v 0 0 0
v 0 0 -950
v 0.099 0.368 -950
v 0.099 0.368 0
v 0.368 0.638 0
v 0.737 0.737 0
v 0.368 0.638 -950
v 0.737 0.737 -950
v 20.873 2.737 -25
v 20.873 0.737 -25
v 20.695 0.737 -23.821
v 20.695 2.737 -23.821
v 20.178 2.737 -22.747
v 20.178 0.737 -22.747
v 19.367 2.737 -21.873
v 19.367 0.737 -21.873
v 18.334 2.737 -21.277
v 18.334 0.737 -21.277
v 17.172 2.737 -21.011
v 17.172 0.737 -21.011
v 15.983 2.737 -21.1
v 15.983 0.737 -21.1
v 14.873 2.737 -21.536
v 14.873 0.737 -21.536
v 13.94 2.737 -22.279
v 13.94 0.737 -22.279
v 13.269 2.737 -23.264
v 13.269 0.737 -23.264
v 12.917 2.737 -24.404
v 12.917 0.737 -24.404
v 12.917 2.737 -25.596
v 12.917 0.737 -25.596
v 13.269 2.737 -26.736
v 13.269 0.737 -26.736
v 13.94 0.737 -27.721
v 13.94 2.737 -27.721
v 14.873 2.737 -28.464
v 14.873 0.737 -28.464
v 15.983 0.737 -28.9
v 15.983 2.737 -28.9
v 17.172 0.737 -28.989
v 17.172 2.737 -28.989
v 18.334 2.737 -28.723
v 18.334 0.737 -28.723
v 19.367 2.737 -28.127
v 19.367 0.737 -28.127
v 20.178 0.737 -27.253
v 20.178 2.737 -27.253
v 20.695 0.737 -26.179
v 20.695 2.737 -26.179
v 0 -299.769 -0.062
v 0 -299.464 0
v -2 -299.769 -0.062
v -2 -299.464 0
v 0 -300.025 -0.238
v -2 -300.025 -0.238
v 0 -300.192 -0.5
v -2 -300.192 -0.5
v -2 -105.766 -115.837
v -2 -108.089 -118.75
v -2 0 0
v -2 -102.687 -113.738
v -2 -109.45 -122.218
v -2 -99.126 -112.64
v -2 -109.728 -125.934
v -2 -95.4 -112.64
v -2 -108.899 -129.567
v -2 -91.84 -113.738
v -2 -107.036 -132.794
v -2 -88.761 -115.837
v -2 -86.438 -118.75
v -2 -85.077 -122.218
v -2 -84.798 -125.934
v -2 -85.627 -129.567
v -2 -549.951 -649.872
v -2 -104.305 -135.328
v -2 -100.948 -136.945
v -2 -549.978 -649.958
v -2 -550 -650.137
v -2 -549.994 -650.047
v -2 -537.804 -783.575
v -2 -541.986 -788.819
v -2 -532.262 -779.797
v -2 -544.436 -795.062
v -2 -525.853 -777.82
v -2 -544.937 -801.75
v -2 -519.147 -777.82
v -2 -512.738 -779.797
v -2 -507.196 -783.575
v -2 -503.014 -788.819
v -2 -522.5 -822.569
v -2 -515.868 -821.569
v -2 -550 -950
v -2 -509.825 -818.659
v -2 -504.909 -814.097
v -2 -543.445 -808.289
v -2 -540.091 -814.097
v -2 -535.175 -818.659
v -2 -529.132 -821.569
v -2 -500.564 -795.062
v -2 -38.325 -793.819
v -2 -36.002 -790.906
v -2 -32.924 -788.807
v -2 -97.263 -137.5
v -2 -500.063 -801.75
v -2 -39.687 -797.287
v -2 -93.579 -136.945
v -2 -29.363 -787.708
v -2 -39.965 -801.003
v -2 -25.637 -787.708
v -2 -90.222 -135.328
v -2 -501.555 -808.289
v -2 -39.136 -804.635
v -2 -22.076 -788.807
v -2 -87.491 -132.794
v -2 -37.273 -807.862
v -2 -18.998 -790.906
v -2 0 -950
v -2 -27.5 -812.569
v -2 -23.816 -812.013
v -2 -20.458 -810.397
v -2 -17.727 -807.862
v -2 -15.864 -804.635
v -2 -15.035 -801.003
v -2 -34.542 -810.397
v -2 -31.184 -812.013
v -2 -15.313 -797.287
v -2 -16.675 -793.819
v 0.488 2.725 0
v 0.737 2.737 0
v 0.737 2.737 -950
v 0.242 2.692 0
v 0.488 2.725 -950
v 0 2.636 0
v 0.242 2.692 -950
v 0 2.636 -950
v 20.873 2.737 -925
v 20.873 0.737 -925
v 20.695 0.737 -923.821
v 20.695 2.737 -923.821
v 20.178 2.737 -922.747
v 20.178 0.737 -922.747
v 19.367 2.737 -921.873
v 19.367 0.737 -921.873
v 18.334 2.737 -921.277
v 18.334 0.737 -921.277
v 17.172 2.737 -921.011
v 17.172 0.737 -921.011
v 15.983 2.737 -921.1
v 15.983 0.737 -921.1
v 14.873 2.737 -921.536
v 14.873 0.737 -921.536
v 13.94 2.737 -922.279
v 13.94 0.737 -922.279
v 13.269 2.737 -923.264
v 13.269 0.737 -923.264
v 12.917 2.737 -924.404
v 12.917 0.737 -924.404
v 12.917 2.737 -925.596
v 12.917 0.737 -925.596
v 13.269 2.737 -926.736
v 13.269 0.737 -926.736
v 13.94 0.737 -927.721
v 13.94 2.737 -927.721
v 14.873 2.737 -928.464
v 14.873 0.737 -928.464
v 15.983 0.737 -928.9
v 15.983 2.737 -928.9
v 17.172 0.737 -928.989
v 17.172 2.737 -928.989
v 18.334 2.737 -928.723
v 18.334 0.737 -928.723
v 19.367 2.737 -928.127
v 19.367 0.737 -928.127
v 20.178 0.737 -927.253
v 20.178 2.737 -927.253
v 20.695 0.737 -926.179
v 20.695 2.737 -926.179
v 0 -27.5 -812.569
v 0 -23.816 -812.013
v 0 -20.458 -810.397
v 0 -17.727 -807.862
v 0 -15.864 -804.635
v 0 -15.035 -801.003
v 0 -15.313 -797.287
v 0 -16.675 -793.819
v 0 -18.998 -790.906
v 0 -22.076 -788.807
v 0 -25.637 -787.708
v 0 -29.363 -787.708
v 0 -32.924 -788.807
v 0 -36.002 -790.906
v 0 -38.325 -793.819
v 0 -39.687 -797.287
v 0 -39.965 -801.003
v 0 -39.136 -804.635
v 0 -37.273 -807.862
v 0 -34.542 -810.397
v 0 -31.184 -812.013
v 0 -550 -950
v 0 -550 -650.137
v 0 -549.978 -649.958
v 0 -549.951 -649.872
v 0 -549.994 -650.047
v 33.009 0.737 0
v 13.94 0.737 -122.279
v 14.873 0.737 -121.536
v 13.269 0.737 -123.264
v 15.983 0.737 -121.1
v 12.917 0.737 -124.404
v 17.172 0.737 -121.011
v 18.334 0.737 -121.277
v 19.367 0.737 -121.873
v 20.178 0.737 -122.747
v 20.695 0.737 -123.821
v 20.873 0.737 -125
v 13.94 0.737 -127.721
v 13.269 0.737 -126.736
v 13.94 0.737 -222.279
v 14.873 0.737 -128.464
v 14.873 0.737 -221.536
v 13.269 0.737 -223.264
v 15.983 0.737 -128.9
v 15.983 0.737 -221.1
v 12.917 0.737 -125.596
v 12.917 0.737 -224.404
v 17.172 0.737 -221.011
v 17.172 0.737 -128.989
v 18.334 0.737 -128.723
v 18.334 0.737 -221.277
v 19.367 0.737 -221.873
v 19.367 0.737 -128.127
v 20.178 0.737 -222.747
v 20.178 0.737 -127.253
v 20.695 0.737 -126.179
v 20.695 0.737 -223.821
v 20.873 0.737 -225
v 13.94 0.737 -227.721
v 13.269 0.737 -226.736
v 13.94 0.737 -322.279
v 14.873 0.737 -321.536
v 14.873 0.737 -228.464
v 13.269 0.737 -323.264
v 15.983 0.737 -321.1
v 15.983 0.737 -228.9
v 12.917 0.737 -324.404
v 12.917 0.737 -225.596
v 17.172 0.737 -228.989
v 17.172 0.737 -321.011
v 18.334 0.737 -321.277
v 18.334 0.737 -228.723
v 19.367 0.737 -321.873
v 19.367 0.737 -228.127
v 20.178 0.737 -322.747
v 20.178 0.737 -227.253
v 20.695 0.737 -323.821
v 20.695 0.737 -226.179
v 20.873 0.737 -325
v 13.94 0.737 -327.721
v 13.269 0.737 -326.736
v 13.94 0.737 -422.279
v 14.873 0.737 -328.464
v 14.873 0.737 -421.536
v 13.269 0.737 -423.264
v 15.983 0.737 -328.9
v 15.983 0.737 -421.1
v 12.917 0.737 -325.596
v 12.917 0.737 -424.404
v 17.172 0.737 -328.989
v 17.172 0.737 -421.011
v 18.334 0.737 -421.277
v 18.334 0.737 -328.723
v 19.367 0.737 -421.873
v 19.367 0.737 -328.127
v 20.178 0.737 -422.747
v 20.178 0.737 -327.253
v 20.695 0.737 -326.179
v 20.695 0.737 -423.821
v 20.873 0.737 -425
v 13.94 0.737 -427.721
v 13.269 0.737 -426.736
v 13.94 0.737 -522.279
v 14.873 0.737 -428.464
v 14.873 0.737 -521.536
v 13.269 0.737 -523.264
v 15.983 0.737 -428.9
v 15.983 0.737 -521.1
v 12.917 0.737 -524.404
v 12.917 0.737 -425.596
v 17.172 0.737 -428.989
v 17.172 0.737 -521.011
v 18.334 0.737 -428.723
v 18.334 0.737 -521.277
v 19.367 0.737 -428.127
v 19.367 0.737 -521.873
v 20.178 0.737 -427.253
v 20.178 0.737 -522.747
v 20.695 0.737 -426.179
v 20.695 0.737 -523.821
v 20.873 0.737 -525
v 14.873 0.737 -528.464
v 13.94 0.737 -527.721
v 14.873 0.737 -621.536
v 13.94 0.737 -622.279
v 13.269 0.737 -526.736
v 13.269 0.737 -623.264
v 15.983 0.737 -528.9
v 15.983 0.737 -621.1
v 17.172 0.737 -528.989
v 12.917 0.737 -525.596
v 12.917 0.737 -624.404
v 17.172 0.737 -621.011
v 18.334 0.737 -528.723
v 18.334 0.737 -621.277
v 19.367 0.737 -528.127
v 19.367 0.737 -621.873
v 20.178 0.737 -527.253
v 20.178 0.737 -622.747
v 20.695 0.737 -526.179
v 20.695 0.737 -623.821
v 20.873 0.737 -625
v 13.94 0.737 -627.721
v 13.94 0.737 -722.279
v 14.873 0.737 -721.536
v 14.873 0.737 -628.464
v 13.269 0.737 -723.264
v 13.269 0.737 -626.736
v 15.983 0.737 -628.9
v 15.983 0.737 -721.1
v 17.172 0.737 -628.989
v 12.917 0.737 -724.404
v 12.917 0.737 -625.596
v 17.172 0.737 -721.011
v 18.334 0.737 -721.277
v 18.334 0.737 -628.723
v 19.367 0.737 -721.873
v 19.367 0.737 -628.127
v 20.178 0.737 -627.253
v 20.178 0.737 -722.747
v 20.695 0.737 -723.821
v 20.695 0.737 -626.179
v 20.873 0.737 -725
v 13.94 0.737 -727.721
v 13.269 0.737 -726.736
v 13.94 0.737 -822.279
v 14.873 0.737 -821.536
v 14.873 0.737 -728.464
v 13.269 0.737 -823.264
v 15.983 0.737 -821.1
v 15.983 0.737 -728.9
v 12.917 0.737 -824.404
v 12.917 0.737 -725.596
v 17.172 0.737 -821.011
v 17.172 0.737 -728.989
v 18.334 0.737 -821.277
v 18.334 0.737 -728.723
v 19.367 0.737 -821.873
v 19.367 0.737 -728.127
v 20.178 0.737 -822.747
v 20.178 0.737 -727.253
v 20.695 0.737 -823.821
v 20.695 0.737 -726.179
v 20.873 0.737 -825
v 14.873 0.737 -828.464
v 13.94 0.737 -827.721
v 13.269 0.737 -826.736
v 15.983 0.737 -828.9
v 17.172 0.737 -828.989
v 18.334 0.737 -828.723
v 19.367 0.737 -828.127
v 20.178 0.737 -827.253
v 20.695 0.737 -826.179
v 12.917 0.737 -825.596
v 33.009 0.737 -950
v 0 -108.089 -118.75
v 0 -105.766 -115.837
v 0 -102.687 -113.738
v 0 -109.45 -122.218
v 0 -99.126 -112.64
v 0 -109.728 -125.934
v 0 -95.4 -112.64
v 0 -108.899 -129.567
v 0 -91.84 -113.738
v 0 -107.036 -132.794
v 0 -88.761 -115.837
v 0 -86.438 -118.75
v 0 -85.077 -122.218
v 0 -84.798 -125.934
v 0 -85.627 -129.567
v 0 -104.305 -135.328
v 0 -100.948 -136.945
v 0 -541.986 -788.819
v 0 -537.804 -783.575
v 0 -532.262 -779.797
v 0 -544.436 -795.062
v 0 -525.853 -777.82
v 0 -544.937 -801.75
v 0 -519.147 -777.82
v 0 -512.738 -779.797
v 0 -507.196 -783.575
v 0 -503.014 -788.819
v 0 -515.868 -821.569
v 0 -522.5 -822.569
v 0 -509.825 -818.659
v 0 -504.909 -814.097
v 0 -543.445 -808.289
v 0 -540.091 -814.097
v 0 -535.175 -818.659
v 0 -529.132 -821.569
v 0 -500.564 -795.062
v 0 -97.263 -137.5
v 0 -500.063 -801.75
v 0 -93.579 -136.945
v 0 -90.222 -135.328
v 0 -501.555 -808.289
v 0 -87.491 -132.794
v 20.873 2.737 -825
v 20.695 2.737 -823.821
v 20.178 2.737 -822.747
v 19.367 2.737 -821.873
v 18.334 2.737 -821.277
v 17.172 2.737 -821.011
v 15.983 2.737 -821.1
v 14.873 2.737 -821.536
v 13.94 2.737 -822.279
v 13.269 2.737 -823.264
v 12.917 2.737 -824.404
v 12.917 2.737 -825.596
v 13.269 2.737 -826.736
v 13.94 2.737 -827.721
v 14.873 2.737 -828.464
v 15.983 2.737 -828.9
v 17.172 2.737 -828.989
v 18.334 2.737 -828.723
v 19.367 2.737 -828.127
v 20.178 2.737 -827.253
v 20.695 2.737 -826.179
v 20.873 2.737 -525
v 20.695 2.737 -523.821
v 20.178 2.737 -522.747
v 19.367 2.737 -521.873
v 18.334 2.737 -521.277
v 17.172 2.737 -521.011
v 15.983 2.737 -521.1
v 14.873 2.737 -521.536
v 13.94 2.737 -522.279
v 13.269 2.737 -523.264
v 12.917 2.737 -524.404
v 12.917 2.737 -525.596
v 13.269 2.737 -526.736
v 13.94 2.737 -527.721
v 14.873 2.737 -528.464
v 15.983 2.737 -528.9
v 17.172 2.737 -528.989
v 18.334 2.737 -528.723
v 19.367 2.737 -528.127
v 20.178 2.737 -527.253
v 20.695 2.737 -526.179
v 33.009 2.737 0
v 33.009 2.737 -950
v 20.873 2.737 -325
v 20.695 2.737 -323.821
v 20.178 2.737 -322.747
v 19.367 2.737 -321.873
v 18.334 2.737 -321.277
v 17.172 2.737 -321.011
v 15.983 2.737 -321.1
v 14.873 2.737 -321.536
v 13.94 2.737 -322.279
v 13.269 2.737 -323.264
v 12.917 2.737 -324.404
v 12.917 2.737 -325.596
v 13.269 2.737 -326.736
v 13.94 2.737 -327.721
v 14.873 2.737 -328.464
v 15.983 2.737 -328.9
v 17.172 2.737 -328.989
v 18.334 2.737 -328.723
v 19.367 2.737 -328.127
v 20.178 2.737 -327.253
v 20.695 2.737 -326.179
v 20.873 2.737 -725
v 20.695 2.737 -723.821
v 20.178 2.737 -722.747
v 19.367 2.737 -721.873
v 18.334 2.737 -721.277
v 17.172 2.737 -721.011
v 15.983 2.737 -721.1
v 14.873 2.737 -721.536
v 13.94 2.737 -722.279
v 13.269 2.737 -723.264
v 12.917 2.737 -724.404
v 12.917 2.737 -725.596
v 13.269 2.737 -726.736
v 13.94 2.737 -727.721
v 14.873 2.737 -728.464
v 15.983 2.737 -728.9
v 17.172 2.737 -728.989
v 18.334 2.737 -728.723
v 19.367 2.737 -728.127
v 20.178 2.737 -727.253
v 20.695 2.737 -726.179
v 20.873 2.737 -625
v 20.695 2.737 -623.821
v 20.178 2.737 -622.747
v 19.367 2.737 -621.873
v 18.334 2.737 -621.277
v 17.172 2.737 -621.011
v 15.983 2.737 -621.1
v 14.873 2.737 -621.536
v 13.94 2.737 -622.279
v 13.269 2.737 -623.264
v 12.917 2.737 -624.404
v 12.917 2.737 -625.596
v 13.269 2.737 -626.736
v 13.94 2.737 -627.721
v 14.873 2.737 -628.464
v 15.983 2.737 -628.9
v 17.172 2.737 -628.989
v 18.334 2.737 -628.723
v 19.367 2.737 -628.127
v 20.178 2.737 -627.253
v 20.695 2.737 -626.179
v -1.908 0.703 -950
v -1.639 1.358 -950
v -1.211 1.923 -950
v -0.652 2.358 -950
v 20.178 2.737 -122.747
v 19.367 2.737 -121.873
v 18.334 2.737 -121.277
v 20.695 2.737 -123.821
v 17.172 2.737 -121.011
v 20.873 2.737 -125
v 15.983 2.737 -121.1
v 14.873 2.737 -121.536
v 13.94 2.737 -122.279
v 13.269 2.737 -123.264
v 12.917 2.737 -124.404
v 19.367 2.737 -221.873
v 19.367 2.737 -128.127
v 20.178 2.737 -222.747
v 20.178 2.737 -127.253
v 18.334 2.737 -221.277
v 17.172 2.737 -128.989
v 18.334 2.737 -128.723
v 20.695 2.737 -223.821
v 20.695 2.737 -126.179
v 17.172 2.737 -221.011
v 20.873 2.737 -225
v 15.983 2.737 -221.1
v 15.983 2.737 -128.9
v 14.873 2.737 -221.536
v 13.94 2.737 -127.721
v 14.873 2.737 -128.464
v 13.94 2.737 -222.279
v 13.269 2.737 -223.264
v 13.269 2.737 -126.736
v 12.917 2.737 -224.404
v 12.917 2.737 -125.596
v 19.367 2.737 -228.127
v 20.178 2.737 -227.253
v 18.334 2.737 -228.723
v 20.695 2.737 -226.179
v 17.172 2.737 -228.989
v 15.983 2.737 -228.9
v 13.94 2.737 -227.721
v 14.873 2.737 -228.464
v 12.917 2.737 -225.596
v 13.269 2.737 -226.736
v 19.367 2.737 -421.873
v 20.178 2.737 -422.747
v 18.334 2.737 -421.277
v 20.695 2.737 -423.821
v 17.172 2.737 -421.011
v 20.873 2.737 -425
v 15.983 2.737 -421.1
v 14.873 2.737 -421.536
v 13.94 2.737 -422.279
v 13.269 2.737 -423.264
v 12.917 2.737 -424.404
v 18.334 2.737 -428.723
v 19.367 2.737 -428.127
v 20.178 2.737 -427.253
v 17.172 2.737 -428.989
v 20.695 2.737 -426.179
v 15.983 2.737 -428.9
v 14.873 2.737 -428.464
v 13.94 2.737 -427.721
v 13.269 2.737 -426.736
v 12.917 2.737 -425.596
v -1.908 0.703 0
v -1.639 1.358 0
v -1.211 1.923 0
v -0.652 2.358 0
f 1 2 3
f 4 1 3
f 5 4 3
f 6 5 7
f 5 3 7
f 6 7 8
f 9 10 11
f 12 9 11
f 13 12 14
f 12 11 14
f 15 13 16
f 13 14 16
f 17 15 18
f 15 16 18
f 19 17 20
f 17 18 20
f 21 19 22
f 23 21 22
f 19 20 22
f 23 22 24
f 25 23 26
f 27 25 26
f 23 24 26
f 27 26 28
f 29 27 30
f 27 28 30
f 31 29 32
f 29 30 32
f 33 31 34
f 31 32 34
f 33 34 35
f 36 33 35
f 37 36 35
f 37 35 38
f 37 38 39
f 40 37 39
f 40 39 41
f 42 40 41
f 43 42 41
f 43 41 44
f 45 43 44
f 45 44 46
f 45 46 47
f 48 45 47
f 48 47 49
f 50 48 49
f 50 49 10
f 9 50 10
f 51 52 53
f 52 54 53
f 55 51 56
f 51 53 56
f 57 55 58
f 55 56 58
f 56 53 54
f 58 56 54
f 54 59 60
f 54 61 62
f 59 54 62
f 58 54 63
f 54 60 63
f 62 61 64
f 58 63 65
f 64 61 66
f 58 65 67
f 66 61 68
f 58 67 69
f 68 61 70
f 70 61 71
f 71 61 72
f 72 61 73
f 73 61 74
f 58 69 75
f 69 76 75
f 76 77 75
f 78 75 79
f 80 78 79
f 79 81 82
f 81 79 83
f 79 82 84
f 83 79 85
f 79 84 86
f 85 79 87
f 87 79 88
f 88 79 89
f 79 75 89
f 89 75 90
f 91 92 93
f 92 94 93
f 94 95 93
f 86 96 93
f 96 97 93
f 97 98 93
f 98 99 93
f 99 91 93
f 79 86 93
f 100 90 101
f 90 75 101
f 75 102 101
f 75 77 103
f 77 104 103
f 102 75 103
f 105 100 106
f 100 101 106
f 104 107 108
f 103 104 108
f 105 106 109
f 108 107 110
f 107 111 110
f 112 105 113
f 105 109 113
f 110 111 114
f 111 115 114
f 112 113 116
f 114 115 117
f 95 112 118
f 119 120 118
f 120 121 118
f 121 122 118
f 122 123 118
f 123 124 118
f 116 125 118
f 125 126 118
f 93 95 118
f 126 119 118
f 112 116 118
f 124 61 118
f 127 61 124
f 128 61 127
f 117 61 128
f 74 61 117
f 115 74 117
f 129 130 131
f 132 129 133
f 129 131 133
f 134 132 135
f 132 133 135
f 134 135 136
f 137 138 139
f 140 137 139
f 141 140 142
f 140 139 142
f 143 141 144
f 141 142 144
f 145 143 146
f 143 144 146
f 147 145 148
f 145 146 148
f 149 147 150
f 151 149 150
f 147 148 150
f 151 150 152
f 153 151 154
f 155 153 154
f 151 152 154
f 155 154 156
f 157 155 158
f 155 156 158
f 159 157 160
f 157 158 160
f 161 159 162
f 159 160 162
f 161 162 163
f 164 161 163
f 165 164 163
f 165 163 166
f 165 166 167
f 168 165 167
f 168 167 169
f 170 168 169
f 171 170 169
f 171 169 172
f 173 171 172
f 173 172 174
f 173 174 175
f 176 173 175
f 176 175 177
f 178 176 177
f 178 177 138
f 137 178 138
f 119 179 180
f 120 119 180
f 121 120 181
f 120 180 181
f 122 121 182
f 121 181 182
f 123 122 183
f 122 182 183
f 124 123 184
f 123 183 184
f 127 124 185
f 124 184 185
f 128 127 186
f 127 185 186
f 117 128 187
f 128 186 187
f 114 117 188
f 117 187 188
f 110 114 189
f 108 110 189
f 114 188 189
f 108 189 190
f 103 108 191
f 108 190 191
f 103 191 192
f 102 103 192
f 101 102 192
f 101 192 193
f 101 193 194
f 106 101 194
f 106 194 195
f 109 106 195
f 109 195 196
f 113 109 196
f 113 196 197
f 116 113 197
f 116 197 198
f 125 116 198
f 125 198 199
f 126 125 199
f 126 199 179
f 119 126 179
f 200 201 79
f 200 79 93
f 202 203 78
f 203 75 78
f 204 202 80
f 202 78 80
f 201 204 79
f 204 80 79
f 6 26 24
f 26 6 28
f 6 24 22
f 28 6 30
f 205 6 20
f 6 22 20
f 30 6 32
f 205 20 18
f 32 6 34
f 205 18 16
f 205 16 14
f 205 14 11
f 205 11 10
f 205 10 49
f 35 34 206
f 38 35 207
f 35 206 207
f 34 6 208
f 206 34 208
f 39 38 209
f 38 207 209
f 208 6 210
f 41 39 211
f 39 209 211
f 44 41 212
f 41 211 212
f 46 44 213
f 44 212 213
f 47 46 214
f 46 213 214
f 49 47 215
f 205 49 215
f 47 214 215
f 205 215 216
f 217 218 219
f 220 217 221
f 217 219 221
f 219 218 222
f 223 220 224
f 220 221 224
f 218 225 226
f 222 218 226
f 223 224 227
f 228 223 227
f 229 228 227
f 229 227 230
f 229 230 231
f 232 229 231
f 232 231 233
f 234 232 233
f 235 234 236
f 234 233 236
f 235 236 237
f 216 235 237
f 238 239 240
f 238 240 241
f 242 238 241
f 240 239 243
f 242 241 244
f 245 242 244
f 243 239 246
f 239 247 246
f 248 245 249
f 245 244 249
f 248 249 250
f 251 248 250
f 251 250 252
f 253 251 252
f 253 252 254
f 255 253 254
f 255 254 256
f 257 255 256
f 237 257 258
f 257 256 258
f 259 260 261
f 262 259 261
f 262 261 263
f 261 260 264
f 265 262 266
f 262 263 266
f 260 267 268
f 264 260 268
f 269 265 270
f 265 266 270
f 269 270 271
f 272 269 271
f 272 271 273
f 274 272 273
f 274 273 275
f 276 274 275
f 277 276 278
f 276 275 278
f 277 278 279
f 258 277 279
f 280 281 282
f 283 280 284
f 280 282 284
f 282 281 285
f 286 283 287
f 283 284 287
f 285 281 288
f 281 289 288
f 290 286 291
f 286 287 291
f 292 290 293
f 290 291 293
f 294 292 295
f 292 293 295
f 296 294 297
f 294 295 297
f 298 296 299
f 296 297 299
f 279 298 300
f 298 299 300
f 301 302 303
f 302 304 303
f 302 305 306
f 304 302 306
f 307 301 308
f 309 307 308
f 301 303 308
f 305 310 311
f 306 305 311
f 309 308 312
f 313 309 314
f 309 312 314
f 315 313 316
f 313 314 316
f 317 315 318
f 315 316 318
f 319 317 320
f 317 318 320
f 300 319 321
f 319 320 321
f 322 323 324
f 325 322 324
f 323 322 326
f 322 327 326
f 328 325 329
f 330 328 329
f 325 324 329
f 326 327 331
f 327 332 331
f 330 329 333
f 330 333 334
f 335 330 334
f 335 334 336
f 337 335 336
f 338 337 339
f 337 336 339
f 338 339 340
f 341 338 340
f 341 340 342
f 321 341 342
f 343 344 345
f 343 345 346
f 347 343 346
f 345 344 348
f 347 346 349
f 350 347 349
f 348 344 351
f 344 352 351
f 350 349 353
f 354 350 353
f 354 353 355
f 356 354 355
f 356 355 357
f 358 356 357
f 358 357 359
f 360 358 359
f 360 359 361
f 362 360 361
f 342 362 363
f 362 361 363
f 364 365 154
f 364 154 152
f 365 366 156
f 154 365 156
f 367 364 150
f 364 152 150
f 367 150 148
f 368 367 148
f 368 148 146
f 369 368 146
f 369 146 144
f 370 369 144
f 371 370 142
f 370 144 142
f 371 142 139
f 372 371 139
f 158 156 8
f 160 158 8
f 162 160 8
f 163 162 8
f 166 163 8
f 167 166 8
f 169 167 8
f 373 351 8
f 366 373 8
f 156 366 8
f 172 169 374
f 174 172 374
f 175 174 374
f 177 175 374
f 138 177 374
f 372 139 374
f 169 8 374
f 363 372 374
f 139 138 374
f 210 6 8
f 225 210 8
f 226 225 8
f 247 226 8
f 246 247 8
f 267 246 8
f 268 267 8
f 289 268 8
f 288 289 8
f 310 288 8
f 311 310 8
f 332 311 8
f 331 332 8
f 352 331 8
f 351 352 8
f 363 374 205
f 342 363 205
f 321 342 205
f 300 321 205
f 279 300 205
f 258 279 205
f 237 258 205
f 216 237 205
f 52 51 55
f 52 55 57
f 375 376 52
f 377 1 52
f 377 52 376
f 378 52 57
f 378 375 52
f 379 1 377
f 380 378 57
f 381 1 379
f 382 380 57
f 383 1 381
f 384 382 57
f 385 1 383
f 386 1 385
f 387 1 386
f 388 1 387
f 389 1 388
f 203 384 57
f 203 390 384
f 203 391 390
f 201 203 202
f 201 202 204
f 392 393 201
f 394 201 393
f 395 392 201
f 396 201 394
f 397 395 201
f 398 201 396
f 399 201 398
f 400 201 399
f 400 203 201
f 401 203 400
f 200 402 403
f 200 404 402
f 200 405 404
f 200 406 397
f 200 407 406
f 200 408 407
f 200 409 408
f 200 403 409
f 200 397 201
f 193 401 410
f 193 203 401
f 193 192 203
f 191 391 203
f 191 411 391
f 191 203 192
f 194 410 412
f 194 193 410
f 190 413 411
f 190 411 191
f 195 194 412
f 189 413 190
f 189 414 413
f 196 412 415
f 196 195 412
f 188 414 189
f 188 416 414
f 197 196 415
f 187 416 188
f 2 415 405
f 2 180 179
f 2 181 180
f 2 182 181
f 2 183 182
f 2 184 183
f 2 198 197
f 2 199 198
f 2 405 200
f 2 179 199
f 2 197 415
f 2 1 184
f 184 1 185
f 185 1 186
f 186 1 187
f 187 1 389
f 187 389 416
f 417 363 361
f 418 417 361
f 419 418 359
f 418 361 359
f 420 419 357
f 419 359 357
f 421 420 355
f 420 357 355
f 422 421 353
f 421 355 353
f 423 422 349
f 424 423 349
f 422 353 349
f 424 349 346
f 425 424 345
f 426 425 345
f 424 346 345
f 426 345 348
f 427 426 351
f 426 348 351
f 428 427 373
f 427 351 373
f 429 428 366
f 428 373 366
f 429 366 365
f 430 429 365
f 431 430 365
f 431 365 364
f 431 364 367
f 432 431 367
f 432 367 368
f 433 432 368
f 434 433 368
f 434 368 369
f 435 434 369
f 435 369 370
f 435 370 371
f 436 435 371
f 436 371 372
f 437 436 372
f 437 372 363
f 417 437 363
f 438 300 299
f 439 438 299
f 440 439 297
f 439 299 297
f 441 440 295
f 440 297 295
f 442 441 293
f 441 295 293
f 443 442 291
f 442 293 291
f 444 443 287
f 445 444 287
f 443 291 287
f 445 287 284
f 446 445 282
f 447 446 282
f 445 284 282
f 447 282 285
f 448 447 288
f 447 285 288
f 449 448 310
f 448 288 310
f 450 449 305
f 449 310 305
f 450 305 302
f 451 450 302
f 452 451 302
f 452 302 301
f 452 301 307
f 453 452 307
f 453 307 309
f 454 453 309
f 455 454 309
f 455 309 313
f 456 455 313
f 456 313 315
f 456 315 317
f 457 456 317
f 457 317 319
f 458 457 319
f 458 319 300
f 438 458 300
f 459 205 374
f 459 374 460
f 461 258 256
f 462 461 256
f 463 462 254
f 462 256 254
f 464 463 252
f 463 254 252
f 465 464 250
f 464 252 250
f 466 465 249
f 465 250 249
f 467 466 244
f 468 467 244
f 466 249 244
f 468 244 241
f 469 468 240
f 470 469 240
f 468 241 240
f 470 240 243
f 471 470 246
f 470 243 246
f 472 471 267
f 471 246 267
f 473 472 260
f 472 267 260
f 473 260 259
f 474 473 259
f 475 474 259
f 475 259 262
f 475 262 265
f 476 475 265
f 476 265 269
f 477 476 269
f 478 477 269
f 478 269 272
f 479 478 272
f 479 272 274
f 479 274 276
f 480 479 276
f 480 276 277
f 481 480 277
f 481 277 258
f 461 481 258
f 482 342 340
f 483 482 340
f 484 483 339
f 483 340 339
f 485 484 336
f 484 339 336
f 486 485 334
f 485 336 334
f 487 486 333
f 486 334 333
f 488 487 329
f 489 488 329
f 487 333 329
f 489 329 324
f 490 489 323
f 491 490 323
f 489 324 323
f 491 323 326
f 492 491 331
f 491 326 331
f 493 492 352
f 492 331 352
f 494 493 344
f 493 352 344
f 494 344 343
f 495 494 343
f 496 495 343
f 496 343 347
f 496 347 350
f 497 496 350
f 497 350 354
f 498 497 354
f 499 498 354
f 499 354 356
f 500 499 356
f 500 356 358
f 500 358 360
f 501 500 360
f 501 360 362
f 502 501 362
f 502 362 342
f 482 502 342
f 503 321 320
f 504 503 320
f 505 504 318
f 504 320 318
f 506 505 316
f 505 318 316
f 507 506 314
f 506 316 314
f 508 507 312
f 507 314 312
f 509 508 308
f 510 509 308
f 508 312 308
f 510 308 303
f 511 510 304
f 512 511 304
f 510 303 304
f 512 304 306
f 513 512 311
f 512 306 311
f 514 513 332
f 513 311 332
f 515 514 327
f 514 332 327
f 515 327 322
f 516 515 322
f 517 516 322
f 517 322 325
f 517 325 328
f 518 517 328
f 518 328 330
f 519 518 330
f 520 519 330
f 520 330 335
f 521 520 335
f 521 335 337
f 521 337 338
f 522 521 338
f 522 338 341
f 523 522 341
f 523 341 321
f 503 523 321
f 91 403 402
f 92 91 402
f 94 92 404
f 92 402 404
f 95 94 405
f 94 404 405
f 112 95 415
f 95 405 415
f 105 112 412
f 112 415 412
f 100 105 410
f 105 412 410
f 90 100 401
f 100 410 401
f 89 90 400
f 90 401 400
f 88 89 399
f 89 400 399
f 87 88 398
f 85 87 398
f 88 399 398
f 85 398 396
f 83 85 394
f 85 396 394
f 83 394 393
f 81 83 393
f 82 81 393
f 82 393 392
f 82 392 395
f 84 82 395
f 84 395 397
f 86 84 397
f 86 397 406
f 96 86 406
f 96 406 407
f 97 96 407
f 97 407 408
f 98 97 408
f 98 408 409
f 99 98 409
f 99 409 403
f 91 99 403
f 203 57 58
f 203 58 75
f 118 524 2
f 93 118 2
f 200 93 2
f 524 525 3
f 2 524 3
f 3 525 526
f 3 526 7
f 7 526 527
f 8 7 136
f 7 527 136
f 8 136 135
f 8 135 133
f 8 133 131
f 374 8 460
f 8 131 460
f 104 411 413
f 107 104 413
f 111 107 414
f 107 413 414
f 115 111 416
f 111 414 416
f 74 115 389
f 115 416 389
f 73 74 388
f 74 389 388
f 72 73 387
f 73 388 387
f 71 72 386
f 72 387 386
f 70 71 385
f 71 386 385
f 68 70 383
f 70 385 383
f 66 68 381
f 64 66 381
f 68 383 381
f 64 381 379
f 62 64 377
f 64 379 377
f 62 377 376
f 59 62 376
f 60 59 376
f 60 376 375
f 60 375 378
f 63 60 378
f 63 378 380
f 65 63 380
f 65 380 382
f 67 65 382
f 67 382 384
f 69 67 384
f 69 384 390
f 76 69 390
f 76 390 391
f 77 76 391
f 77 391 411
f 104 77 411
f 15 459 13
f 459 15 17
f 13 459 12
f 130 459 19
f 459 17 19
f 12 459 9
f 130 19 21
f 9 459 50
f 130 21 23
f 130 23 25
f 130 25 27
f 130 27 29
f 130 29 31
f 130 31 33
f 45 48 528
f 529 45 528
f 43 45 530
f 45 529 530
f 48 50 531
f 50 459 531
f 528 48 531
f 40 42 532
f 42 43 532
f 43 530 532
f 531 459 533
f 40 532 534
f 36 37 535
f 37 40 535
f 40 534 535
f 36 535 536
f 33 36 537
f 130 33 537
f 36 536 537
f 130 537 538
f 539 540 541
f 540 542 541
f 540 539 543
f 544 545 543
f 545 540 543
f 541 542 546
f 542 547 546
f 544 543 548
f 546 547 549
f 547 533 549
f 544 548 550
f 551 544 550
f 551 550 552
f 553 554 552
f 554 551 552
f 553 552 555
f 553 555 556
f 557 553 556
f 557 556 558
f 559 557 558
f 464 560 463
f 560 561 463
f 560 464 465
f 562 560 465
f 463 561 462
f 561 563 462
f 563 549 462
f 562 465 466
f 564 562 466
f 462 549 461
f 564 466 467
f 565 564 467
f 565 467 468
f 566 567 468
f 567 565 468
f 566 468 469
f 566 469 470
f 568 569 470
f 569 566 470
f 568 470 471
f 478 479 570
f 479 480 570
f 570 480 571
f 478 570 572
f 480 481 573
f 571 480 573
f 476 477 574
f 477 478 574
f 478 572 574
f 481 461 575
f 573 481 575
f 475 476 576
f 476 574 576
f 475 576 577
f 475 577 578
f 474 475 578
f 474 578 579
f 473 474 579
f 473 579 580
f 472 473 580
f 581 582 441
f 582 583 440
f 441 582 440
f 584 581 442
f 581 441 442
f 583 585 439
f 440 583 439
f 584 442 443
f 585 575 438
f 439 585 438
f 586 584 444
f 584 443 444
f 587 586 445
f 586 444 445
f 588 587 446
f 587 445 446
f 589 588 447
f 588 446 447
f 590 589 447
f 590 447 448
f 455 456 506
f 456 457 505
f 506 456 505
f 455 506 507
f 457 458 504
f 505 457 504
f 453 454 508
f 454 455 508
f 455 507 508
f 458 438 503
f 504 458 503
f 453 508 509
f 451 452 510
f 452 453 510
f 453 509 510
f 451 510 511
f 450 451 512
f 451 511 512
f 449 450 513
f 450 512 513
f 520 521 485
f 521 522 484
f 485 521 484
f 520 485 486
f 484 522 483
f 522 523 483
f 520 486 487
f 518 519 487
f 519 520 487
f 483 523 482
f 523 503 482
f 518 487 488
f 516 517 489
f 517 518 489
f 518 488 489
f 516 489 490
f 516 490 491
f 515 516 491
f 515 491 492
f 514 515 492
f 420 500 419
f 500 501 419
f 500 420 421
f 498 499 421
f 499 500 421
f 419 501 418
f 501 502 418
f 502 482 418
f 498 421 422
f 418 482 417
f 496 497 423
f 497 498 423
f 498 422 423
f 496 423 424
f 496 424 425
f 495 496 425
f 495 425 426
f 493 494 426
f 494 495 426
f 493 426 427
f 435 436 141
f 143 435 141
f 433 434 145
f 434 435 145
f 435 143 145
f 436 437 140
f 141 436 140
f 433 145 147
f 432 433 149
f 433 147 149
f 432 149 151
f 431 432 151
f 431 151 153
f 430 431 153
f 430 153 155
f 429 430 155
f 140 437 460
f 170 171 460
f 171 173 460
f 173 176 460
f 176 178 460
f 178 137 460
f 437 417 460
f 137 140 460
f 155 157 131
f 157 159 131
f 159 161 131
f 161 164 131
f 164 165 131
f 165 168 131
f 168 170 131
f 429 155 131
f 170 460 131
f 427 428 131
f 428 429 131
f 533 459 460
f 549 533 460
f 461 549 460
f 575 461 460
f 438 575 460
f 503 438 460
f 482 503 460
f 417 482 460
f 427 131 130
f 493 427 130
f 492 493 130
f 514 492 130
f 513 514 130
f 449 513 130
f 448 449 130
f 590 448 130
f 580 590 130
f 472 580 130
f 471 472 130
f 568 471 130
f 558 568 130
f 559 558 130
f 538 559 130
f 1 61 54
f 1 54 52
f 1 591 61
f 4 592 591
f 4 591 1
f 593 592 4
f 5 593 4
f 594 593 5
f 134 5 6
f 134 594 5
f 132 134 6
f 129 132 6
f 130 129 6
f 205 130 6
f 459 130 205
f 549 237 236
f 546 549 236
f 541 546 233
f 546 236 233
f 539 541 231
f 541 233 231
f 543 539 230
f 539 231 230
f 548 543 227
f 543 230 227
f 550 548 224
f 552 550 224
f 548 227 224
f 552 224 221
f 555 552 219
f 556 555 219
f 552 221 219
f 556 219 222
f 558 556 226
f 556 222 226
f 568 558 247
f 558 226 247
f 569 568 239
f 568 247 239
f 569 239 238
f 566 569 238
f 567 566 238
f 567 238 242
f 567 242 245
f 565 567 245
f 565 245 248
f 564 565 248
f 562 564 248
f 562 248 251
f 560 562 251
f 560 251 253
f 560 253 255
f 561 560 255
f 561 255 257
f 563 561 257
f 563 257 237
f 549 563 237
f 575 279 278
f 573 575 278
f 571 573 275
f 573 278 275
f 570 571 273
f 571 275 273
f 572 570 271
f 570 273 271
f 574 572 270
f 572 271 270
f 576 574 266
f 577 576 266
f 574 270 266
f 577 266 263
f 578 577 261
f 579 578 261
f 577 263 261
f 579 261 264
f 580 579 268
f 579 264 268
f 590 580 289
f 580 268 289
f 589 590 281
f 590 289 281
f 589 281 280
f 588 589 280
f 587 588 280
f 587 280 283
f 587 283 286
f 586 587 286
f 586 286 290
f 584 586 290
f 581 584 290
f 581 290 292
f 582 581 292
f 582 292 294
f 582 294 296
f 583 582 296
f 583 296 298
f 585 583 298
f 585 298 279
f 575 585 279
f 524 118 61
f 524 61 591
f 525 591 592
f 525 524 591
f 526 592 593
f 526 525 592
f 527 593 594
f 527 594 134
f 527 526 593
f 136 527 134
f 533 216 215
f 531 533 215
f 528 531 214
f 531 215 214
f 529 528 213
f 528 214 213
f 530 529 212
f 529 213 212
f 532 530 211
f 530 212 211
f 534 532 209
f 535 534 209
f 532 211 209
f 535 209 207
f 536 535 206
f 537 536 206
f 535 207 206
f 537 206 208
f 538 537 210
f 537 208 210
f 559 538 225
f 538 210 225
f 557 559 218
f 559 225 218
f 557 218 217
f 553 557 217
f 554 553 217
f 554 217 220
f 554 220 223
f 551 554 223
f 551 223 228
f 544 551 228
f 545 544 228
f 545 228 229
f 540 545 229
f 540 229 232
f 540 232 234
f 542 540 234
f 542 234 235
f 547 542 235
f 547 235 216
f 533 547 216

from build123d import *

# Parameters (mm, degrees)
BASE_FLANGE1_DEPTH     = 2
TAB1_START             = -2
TAB1_OUTLINE_W         = 950
TAB1_OUTLINE_H         = 35
TAB1_DEPTH             = 2
SKETCHED_START         = -950
SKETCHED_BEND1_DEPTH   = 950
SKETCHED_BEND1_2_DEPTH = 950
FILLET1_R              = 0.78
FILLET2_R              = 0.74
SKETCH10_R             = 12.5
SKETCH10_R_2           = 22.5
CUT_EXTRUDE1_DEPTH     = 10
SKETCH11_R             = 4
CUT_EXTRUDE2_DEPTH     = 10
SKETCH12_R             = 12.5
CUT_EXTRUDE3_DEPTH     = 10


# Read off the part's stored shape, not the designer's step: Tab1, Sketched Bend1
# Sheet-metal steps are written as plain solids
with BuildPart() as part:
    # Sketch1 → Base-Flange1 (new body)
    with BuildSketch(Plane(origin=(0, 0, 0), x_dir=(0, 0, -1), z_dir=(1, 0, 0))):
        Polygon((0, 0), (0, -300), (650, -550), (950, -550), (950, 0), align=None)
    extrude(amount=-BASE_FLANGE1_DEPTH)

    # Tab1 outline → Tab1 (add)
    with BuildSketch(Plane(origin=(0, 0, 0), x_dir=(0, 0, -1), z_dir=(1, 0, 0)).offset(TAB1_START)):
        with Locations((475, 17.5)):
            Rectangle(TAB1_OUTLINE_W, TAB1_OUTLINE_H)
    extrude(amount=TAB1_DEPTH)

    # Sketched Bend1 outline → Sketched Bend1 (cut)
    with BuildSketch(Plane.XY.offset(SKETCHED_START)):
        with BuildLine():
            ThreePointArc((-2, 0), (-1.443395312, 1.654267209), (0, 2.635602398))
            Line((0, 2.635602398), (0, 35))
            Line((0, 35), (-2, 35))
            Line((-2, 35), (-2, 0))
        make_face()
    extrude(amount=SKETCHED_BEND1_DEPTH, mode=Mode.SUBTRACT)

    # Sketched Bend1 2 outline → Sketched Bend1 2 (add)
    with BuildSketch(Plane.XY.offset(SKETCHED_START)):
        with BuildLine():
            Line((33.008755099, 2.7366), (0.7366, 2.7366))
            ThreePointArc((0.7366, 2.7366), (0.364854094, 2.711233029), (0, 2.635602398))
            Line((0, 2.635602398), (0, 0))
            ThreePointArc((0, 0), (0.215745145, 0.520854855), (0.7366, 0.7366))
            Line((0.7366, 0.7366), (33.008755099, 0.7366))
            Line((33.008755099, 0.7366), (33.008755099, 2.7366))
        make_face()
    extrude(amount=SKETCHED_BEND1_2_DEPTH)

    # Fillet1
    fillet1_edges = [part.edges().sort_by_distance(p)[0] for p in [
        (-1, -300, 0),
    ]]
    fillet(fillet1_edges, radius=FILLET1_R)

    # Fillet2
    fillet2_edges = [part.edges().sort_by_distance(p)[0] for p in [
        (-1, -550, -650),
    ]]
    fillet(fillet2_edges, radius=FILLET2_R)

    # Sketch10 → Cut-Extrude1 (cut)
    with BuildSketch(Plane(origin=(0, 0, 0), x_dir=(0, 0, -1), z_dir=(1, 0, 0))):
        with Locations((800.068700733, -27.5)):
            Circle(SKETCH10_R)
        with Locations((800.068700733, -522.5)):
            Circle(SKETCH10_R_2)
    extrude(amount=-CUT_EXTRUDE1_DEPTH, mode=Mode.SUBTRACT)

    # Sketch11 → Cut-Extrude2 (cut)
    with BuildSketch(Plane.XZ.offset(-0.7366)):
        with Locations((16.872677549, -25)):
            Circle(SKETCH11_R)
        with Locations((16.872677549, -125)):
            Circle(SKETCH11_R)
        with Locations((16.872677549, -225)):
            Circle(SKETCH11_R)
        with Locations((16.872677549, -325)):
            Circle(SKETCH11_R)
        with Locations((16.872677549, -425)):
            Circle(SKETCH11_R)
        with Locations((16.872677549, -525)):
            Circle(SKETCH11_R)
        with Locations((16.872677549, -625)):
            Circle(SKETCH11_R)
        with Locations((16.872677549, -725)):
            Circle(SKETCH11_R)
        with Locations((16.872677549, -825)):
            Circle(SKETCH11_R)
        with Locations((16.872677549, -925)):
            Circle(SKETCH11_R)
    extrude(amount=-CUT_EXTRUDE2_DEPTH, mode=Mode.SUBTRACT)

    # Sketch12 → Cut-Extrude3 (cut)
    with BuildSketch(Plane(origin=(0, 0, 0), x_dir=(0, 0, -1), z_dir=(1, 0, 0))):
        with Locations((125, -97.2634)):
            Circle(SKETCH12_R)
    extrude(amount=-CUT_EXTRUDE3_DEPTH, mode=Mode.SUBTRACT)


solid = part.part
